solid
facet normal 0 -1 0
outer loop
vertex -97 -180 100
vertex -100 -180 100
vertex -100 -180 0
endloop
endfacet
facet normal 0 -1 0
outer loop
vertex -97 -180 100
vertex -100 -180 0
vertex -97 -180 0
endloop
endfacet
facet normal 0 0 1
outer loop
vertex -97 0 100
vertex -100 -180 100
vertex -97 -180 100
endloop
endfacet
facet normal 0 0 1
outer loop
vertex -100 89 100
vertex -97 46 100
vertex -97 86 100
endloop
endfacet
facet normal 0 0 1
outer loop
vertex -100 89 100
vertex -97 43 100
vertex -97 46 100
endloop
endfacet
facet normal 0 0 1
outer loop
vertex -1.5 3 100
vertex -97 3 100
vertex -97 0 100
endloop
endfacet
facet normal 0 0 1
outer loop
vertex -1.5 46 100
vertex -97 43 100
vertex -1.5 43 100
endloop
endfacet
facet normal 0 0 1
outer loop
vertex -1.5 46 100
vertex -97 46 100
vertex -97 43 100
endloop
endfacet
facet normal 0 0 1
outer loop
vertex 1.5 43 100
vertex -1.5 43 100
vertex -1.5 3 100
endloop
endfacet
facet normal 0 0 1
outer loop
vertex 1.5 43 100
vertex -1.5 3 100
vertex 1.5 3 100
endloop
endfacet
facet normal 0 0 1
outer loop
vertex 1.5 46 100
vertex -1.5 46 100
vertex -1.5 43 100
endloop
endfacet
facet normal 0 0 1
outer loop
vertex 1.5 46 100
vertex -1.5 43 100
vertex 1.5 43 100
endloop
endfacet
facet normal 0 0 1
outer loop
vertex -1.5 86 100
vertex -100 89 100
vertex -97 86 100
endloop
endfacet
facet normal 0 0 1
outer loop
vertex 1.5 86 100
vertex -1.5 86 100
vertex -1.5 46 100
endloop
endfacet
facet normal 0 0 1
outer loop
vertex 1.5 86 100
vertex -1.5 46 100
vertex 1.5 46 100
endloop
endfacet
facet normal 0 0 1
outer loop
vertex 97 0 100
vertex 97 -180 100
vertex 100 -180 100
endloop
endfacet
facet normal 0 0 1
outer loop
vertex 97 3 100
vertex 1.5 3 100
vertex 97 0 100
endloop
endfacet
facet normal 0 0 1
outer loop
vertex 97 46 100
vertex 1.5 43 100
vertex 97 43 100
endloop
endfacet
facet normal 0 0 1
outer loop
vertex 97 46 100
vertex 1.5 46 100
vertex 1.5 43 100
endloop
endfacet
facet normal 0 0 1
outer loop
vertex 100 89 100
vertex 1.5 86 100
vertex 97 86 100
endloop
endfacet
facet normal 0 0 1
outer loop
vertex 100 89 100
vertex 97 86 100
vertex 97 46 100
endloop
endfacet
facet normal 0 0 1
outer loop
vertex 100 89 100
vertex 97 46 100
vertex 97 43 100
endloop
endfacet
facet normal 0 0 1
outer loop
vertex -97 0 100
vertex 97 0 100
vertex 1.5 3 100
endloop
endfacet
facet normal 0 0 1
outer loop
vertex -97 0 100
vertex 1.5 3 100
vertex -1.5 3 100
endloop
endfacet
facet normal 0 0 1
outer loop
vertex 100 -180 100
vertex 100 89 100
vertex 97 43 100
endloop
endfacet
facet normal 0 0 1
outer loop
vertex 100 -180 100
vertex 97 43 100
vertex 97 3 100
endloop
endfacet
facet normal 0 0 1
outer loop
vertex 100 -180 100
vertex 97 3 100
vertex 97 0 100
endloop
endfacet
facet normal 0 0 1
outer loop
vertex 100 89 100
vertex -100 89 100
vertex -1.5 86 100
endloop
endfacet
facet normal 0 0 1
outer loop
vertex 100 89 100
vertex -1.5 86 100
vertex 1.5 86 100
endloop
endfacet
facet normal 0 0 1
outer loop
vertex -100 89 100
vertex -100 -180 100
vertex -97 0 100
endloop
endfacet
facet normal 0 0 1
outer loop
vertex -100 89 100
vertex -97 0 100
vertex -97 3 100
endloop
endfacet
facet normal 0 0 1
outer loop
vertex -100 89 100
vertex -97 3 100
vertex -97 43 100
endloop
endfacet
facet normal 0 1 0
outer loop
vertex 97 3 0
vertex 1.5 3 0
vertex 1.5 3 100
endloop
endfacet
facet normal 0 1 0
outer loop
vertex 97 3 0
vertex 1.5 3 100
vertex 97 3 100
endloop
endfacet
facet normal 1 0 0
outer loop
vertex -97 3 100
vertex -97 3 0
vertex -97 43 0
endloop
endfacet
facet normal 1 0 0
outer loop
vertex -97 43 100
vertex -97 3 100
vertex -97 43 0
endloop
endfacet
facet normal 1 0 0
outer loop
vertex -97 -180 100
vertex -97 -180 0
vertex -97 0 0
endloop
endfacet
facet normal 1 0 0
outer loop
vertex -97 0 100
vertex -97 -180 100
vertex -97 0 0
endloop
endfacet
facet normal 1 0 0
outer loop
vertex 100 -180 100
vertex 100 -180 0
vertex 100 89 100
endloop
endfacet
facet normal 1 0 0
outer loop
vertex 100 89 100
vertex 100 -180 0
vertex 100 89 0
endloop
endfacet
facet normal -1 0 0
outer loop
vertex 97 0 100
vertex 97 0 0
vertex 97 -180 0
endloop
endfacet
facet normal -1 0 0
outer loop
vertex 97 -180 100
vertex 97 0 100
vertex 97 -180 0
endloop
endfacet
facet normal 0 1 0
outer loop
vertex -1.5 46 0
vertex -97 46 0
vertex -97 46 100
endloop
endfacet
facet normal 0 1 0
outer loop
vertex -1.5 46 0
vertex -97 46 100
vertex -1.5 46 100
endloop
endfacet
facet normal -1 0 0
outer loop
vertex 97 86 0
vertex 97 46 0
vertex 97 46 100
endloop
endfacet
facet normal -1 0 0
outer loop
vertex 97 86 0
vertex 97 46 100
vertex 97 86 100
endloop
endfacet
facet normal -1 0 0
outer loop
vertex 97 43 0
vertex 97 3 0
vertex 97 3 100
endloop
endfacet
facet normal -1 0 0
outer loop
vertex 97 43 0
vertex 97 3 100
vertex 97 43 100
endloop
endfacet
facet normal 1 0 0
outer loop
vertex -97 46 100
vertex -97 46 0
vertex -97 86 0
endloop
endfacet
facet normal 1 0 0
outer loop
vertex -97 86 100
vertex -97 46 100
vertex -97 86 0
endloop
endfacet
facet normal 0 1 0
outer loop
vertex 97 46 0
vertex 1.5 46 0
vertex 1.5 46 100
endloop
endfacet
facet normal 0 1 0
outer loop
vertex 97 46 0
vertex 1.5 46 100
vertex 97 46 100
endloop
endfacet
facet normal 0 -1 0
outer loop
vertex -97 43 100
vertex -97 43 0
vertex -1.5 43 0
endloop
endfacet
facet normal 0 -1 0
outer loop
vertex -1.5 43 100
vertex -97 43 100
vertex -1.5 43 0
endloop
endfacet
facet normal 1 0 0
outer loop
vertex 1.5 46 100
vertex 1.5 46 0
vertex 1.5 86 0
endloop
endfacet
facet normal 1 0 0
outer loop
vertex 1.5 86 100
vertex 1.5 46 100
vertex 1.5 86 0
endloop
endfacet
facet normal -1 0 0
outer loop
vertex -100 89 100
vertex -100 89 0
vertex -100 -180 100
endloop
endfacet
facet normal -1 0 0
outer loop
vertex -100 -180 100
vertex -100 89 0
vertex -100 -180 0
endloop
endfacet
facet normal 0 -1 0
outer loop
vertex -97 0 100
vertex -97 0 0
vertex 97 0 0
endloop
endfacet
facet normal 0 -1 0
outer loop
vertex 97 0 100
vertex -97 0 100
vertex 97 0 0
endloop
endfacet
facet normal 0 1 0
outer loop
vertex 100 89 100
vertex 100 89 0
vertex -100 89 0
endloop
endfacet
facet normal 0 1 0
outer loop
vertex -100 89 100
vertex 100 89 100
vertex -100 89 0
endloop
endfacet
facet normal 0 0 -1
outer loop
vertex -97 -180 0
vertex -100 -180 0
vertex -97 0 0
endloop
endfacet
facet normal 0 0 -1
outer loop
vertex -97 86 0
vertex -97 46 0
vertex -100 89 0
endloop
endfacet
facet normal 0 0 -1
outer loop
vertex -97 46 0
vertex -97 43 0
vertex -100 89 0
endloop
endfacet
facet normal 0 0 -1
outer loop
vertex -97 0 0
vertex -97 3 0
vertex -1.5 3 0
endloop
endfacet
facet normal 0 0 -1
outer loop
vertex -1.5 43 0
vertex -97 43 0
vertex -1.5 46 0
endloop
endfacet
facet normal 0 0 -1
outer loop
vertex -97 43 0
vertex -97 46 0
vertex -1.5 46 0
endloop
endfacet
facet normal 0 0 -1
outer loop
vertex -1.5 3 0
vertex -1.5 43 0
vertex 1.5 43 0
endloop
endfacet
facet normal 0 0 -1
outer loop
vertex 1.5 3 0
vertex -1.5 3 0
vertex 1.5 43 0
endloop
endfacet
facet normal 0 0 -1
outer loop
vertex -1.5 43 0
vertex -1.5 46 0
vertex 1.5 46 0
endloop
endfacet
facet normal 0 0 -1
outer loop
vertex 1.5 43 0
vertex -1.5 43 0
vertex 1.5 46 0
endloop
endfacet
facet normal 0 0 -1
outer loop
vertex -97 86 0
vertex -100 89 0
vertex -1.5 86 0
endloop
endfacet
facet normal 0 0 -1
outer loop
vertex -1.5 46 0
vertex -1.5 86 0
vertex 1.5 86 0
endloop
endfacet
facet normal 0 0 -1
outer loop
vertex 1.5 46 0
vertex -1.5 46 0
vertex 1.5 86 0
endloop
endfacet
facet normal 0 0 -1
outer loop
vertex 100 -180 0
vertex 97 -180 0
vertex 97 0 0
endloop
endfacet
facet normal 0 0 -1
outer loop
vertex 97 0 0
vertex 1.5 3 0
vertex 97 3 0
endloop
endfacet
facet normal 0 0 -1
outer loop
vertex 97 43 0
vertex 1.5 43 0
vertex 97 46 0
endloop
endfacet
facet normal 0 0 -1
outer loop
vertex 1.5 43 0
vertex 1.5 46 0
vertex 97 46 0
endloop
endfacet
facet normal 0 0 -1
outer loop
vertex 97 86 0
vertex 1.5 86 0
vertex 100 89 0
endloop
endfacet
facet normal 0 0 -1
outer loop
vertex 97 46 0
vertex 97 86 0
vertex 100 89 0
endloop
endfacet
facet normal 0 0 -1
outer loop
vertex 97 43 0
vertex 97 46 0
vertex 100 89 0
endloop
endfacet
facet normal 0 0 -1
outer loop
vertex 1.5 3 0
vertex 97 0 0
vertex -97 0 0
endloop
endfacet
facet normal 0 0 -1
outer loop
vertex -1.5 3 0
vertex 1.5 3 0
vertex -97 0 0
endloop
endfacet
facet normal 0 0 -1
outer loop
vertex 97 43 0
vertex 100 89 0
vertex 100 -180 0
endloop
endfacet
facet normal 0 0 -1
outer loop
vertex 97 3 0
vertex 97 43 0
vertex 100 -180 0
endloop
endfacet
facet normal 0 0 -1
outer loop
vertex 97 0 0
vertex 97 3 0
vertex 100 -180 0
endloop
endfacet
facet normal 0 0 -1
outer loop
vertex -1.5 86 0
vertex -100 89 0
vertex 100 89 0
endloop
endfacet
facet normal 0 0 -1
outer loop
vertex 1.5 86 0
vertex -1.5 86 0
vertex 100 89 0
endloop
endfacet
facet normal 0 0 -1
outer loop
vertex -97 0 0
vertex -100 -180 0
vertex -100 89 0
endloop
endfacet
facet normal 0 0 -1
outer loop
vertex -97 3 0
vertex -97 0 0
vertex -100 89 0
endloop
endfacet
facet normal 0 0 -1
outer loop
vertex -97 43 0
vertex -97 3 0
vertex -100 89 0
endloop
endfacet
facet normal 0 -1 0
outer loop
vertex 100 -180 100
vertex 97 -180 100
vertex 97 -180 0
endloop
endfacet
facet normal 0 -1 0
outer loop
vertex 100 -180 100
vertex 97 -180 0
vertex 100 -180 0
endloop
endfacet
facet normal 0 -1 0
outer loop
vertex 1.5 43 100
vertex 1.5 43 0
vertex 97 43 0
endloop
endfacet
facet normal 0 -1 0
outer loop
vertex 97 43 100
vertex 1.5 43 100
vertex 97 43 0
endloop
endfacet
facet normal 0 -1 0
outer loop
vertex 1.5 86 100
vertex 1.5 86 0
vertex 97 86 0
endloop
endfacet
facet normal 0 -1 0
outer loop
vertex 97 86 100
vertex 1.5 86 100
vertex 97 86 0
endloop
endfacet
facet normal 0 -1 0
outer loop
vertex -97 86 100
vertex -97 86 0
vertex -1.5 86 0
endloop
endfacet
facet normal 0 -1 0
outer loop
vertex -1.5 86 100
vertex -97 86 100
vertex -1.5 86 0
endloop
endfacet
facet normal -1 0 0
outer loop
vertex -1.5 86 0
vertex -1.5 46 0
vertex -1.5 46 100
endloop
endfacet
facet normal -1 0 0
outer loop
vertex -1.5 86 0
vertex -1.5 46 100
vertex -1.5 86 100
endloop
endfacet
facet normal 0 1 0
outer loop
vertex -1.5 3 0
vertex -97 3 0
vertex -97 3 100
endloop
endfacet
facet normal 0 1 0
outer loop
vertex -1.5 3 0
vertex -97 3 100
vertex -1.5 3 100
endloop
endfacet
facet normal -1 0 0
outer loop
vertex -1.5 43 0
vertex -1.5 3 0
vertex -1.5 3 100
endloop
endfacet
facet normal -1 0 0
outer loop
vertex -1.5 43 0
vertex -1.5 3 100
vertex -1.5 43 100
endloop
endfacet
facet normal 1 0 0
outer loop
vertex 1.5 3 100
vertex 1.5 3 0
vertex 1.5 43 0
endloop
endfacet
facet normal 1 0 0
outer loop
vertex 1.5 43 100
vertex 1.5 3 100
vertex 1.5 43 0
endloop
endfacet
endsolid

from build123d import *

# Parameters (mm, degrees)
SKETCH1_W           = 95.5
SKETCH1_H           = 40
BOSS_EXTRUDE1_DEPTH = 100


with BuildPart() as part:
    # Sketch1 → Boss-Extrude1 (new body)
    with BuildSketch(Plane.XY):
        Polygon((-97, 0), (97, 0), (97, -180), (100, -180), (100, 89), (-100, 89), (-100, -180), (-97, -180), align=None)
        with Locations((-49.25, 23)):
            Rectangle(SKETCH1_W, SKETCH1_H, mode=Mode.SUBTRACT)
        with Locations((-49.25, 66)):
            Rectangle(SKETCH1_W, SKETCH1_H, mode=Mode.SUBTRACT)
        with Locations((49.25, 66)):
            Rectangle(SKETCH1_W, SKETCH1_H, mode=Mode.SUBTRACT)
        with Locations((49.25, 23)):
            Rectangle(SKETCH1_W, SKETCH1_H, mode=Mode.SUBTRACT)
    extrude(amount=BOSS_EXTRUDE1_DEPTH)


solid = part.part
